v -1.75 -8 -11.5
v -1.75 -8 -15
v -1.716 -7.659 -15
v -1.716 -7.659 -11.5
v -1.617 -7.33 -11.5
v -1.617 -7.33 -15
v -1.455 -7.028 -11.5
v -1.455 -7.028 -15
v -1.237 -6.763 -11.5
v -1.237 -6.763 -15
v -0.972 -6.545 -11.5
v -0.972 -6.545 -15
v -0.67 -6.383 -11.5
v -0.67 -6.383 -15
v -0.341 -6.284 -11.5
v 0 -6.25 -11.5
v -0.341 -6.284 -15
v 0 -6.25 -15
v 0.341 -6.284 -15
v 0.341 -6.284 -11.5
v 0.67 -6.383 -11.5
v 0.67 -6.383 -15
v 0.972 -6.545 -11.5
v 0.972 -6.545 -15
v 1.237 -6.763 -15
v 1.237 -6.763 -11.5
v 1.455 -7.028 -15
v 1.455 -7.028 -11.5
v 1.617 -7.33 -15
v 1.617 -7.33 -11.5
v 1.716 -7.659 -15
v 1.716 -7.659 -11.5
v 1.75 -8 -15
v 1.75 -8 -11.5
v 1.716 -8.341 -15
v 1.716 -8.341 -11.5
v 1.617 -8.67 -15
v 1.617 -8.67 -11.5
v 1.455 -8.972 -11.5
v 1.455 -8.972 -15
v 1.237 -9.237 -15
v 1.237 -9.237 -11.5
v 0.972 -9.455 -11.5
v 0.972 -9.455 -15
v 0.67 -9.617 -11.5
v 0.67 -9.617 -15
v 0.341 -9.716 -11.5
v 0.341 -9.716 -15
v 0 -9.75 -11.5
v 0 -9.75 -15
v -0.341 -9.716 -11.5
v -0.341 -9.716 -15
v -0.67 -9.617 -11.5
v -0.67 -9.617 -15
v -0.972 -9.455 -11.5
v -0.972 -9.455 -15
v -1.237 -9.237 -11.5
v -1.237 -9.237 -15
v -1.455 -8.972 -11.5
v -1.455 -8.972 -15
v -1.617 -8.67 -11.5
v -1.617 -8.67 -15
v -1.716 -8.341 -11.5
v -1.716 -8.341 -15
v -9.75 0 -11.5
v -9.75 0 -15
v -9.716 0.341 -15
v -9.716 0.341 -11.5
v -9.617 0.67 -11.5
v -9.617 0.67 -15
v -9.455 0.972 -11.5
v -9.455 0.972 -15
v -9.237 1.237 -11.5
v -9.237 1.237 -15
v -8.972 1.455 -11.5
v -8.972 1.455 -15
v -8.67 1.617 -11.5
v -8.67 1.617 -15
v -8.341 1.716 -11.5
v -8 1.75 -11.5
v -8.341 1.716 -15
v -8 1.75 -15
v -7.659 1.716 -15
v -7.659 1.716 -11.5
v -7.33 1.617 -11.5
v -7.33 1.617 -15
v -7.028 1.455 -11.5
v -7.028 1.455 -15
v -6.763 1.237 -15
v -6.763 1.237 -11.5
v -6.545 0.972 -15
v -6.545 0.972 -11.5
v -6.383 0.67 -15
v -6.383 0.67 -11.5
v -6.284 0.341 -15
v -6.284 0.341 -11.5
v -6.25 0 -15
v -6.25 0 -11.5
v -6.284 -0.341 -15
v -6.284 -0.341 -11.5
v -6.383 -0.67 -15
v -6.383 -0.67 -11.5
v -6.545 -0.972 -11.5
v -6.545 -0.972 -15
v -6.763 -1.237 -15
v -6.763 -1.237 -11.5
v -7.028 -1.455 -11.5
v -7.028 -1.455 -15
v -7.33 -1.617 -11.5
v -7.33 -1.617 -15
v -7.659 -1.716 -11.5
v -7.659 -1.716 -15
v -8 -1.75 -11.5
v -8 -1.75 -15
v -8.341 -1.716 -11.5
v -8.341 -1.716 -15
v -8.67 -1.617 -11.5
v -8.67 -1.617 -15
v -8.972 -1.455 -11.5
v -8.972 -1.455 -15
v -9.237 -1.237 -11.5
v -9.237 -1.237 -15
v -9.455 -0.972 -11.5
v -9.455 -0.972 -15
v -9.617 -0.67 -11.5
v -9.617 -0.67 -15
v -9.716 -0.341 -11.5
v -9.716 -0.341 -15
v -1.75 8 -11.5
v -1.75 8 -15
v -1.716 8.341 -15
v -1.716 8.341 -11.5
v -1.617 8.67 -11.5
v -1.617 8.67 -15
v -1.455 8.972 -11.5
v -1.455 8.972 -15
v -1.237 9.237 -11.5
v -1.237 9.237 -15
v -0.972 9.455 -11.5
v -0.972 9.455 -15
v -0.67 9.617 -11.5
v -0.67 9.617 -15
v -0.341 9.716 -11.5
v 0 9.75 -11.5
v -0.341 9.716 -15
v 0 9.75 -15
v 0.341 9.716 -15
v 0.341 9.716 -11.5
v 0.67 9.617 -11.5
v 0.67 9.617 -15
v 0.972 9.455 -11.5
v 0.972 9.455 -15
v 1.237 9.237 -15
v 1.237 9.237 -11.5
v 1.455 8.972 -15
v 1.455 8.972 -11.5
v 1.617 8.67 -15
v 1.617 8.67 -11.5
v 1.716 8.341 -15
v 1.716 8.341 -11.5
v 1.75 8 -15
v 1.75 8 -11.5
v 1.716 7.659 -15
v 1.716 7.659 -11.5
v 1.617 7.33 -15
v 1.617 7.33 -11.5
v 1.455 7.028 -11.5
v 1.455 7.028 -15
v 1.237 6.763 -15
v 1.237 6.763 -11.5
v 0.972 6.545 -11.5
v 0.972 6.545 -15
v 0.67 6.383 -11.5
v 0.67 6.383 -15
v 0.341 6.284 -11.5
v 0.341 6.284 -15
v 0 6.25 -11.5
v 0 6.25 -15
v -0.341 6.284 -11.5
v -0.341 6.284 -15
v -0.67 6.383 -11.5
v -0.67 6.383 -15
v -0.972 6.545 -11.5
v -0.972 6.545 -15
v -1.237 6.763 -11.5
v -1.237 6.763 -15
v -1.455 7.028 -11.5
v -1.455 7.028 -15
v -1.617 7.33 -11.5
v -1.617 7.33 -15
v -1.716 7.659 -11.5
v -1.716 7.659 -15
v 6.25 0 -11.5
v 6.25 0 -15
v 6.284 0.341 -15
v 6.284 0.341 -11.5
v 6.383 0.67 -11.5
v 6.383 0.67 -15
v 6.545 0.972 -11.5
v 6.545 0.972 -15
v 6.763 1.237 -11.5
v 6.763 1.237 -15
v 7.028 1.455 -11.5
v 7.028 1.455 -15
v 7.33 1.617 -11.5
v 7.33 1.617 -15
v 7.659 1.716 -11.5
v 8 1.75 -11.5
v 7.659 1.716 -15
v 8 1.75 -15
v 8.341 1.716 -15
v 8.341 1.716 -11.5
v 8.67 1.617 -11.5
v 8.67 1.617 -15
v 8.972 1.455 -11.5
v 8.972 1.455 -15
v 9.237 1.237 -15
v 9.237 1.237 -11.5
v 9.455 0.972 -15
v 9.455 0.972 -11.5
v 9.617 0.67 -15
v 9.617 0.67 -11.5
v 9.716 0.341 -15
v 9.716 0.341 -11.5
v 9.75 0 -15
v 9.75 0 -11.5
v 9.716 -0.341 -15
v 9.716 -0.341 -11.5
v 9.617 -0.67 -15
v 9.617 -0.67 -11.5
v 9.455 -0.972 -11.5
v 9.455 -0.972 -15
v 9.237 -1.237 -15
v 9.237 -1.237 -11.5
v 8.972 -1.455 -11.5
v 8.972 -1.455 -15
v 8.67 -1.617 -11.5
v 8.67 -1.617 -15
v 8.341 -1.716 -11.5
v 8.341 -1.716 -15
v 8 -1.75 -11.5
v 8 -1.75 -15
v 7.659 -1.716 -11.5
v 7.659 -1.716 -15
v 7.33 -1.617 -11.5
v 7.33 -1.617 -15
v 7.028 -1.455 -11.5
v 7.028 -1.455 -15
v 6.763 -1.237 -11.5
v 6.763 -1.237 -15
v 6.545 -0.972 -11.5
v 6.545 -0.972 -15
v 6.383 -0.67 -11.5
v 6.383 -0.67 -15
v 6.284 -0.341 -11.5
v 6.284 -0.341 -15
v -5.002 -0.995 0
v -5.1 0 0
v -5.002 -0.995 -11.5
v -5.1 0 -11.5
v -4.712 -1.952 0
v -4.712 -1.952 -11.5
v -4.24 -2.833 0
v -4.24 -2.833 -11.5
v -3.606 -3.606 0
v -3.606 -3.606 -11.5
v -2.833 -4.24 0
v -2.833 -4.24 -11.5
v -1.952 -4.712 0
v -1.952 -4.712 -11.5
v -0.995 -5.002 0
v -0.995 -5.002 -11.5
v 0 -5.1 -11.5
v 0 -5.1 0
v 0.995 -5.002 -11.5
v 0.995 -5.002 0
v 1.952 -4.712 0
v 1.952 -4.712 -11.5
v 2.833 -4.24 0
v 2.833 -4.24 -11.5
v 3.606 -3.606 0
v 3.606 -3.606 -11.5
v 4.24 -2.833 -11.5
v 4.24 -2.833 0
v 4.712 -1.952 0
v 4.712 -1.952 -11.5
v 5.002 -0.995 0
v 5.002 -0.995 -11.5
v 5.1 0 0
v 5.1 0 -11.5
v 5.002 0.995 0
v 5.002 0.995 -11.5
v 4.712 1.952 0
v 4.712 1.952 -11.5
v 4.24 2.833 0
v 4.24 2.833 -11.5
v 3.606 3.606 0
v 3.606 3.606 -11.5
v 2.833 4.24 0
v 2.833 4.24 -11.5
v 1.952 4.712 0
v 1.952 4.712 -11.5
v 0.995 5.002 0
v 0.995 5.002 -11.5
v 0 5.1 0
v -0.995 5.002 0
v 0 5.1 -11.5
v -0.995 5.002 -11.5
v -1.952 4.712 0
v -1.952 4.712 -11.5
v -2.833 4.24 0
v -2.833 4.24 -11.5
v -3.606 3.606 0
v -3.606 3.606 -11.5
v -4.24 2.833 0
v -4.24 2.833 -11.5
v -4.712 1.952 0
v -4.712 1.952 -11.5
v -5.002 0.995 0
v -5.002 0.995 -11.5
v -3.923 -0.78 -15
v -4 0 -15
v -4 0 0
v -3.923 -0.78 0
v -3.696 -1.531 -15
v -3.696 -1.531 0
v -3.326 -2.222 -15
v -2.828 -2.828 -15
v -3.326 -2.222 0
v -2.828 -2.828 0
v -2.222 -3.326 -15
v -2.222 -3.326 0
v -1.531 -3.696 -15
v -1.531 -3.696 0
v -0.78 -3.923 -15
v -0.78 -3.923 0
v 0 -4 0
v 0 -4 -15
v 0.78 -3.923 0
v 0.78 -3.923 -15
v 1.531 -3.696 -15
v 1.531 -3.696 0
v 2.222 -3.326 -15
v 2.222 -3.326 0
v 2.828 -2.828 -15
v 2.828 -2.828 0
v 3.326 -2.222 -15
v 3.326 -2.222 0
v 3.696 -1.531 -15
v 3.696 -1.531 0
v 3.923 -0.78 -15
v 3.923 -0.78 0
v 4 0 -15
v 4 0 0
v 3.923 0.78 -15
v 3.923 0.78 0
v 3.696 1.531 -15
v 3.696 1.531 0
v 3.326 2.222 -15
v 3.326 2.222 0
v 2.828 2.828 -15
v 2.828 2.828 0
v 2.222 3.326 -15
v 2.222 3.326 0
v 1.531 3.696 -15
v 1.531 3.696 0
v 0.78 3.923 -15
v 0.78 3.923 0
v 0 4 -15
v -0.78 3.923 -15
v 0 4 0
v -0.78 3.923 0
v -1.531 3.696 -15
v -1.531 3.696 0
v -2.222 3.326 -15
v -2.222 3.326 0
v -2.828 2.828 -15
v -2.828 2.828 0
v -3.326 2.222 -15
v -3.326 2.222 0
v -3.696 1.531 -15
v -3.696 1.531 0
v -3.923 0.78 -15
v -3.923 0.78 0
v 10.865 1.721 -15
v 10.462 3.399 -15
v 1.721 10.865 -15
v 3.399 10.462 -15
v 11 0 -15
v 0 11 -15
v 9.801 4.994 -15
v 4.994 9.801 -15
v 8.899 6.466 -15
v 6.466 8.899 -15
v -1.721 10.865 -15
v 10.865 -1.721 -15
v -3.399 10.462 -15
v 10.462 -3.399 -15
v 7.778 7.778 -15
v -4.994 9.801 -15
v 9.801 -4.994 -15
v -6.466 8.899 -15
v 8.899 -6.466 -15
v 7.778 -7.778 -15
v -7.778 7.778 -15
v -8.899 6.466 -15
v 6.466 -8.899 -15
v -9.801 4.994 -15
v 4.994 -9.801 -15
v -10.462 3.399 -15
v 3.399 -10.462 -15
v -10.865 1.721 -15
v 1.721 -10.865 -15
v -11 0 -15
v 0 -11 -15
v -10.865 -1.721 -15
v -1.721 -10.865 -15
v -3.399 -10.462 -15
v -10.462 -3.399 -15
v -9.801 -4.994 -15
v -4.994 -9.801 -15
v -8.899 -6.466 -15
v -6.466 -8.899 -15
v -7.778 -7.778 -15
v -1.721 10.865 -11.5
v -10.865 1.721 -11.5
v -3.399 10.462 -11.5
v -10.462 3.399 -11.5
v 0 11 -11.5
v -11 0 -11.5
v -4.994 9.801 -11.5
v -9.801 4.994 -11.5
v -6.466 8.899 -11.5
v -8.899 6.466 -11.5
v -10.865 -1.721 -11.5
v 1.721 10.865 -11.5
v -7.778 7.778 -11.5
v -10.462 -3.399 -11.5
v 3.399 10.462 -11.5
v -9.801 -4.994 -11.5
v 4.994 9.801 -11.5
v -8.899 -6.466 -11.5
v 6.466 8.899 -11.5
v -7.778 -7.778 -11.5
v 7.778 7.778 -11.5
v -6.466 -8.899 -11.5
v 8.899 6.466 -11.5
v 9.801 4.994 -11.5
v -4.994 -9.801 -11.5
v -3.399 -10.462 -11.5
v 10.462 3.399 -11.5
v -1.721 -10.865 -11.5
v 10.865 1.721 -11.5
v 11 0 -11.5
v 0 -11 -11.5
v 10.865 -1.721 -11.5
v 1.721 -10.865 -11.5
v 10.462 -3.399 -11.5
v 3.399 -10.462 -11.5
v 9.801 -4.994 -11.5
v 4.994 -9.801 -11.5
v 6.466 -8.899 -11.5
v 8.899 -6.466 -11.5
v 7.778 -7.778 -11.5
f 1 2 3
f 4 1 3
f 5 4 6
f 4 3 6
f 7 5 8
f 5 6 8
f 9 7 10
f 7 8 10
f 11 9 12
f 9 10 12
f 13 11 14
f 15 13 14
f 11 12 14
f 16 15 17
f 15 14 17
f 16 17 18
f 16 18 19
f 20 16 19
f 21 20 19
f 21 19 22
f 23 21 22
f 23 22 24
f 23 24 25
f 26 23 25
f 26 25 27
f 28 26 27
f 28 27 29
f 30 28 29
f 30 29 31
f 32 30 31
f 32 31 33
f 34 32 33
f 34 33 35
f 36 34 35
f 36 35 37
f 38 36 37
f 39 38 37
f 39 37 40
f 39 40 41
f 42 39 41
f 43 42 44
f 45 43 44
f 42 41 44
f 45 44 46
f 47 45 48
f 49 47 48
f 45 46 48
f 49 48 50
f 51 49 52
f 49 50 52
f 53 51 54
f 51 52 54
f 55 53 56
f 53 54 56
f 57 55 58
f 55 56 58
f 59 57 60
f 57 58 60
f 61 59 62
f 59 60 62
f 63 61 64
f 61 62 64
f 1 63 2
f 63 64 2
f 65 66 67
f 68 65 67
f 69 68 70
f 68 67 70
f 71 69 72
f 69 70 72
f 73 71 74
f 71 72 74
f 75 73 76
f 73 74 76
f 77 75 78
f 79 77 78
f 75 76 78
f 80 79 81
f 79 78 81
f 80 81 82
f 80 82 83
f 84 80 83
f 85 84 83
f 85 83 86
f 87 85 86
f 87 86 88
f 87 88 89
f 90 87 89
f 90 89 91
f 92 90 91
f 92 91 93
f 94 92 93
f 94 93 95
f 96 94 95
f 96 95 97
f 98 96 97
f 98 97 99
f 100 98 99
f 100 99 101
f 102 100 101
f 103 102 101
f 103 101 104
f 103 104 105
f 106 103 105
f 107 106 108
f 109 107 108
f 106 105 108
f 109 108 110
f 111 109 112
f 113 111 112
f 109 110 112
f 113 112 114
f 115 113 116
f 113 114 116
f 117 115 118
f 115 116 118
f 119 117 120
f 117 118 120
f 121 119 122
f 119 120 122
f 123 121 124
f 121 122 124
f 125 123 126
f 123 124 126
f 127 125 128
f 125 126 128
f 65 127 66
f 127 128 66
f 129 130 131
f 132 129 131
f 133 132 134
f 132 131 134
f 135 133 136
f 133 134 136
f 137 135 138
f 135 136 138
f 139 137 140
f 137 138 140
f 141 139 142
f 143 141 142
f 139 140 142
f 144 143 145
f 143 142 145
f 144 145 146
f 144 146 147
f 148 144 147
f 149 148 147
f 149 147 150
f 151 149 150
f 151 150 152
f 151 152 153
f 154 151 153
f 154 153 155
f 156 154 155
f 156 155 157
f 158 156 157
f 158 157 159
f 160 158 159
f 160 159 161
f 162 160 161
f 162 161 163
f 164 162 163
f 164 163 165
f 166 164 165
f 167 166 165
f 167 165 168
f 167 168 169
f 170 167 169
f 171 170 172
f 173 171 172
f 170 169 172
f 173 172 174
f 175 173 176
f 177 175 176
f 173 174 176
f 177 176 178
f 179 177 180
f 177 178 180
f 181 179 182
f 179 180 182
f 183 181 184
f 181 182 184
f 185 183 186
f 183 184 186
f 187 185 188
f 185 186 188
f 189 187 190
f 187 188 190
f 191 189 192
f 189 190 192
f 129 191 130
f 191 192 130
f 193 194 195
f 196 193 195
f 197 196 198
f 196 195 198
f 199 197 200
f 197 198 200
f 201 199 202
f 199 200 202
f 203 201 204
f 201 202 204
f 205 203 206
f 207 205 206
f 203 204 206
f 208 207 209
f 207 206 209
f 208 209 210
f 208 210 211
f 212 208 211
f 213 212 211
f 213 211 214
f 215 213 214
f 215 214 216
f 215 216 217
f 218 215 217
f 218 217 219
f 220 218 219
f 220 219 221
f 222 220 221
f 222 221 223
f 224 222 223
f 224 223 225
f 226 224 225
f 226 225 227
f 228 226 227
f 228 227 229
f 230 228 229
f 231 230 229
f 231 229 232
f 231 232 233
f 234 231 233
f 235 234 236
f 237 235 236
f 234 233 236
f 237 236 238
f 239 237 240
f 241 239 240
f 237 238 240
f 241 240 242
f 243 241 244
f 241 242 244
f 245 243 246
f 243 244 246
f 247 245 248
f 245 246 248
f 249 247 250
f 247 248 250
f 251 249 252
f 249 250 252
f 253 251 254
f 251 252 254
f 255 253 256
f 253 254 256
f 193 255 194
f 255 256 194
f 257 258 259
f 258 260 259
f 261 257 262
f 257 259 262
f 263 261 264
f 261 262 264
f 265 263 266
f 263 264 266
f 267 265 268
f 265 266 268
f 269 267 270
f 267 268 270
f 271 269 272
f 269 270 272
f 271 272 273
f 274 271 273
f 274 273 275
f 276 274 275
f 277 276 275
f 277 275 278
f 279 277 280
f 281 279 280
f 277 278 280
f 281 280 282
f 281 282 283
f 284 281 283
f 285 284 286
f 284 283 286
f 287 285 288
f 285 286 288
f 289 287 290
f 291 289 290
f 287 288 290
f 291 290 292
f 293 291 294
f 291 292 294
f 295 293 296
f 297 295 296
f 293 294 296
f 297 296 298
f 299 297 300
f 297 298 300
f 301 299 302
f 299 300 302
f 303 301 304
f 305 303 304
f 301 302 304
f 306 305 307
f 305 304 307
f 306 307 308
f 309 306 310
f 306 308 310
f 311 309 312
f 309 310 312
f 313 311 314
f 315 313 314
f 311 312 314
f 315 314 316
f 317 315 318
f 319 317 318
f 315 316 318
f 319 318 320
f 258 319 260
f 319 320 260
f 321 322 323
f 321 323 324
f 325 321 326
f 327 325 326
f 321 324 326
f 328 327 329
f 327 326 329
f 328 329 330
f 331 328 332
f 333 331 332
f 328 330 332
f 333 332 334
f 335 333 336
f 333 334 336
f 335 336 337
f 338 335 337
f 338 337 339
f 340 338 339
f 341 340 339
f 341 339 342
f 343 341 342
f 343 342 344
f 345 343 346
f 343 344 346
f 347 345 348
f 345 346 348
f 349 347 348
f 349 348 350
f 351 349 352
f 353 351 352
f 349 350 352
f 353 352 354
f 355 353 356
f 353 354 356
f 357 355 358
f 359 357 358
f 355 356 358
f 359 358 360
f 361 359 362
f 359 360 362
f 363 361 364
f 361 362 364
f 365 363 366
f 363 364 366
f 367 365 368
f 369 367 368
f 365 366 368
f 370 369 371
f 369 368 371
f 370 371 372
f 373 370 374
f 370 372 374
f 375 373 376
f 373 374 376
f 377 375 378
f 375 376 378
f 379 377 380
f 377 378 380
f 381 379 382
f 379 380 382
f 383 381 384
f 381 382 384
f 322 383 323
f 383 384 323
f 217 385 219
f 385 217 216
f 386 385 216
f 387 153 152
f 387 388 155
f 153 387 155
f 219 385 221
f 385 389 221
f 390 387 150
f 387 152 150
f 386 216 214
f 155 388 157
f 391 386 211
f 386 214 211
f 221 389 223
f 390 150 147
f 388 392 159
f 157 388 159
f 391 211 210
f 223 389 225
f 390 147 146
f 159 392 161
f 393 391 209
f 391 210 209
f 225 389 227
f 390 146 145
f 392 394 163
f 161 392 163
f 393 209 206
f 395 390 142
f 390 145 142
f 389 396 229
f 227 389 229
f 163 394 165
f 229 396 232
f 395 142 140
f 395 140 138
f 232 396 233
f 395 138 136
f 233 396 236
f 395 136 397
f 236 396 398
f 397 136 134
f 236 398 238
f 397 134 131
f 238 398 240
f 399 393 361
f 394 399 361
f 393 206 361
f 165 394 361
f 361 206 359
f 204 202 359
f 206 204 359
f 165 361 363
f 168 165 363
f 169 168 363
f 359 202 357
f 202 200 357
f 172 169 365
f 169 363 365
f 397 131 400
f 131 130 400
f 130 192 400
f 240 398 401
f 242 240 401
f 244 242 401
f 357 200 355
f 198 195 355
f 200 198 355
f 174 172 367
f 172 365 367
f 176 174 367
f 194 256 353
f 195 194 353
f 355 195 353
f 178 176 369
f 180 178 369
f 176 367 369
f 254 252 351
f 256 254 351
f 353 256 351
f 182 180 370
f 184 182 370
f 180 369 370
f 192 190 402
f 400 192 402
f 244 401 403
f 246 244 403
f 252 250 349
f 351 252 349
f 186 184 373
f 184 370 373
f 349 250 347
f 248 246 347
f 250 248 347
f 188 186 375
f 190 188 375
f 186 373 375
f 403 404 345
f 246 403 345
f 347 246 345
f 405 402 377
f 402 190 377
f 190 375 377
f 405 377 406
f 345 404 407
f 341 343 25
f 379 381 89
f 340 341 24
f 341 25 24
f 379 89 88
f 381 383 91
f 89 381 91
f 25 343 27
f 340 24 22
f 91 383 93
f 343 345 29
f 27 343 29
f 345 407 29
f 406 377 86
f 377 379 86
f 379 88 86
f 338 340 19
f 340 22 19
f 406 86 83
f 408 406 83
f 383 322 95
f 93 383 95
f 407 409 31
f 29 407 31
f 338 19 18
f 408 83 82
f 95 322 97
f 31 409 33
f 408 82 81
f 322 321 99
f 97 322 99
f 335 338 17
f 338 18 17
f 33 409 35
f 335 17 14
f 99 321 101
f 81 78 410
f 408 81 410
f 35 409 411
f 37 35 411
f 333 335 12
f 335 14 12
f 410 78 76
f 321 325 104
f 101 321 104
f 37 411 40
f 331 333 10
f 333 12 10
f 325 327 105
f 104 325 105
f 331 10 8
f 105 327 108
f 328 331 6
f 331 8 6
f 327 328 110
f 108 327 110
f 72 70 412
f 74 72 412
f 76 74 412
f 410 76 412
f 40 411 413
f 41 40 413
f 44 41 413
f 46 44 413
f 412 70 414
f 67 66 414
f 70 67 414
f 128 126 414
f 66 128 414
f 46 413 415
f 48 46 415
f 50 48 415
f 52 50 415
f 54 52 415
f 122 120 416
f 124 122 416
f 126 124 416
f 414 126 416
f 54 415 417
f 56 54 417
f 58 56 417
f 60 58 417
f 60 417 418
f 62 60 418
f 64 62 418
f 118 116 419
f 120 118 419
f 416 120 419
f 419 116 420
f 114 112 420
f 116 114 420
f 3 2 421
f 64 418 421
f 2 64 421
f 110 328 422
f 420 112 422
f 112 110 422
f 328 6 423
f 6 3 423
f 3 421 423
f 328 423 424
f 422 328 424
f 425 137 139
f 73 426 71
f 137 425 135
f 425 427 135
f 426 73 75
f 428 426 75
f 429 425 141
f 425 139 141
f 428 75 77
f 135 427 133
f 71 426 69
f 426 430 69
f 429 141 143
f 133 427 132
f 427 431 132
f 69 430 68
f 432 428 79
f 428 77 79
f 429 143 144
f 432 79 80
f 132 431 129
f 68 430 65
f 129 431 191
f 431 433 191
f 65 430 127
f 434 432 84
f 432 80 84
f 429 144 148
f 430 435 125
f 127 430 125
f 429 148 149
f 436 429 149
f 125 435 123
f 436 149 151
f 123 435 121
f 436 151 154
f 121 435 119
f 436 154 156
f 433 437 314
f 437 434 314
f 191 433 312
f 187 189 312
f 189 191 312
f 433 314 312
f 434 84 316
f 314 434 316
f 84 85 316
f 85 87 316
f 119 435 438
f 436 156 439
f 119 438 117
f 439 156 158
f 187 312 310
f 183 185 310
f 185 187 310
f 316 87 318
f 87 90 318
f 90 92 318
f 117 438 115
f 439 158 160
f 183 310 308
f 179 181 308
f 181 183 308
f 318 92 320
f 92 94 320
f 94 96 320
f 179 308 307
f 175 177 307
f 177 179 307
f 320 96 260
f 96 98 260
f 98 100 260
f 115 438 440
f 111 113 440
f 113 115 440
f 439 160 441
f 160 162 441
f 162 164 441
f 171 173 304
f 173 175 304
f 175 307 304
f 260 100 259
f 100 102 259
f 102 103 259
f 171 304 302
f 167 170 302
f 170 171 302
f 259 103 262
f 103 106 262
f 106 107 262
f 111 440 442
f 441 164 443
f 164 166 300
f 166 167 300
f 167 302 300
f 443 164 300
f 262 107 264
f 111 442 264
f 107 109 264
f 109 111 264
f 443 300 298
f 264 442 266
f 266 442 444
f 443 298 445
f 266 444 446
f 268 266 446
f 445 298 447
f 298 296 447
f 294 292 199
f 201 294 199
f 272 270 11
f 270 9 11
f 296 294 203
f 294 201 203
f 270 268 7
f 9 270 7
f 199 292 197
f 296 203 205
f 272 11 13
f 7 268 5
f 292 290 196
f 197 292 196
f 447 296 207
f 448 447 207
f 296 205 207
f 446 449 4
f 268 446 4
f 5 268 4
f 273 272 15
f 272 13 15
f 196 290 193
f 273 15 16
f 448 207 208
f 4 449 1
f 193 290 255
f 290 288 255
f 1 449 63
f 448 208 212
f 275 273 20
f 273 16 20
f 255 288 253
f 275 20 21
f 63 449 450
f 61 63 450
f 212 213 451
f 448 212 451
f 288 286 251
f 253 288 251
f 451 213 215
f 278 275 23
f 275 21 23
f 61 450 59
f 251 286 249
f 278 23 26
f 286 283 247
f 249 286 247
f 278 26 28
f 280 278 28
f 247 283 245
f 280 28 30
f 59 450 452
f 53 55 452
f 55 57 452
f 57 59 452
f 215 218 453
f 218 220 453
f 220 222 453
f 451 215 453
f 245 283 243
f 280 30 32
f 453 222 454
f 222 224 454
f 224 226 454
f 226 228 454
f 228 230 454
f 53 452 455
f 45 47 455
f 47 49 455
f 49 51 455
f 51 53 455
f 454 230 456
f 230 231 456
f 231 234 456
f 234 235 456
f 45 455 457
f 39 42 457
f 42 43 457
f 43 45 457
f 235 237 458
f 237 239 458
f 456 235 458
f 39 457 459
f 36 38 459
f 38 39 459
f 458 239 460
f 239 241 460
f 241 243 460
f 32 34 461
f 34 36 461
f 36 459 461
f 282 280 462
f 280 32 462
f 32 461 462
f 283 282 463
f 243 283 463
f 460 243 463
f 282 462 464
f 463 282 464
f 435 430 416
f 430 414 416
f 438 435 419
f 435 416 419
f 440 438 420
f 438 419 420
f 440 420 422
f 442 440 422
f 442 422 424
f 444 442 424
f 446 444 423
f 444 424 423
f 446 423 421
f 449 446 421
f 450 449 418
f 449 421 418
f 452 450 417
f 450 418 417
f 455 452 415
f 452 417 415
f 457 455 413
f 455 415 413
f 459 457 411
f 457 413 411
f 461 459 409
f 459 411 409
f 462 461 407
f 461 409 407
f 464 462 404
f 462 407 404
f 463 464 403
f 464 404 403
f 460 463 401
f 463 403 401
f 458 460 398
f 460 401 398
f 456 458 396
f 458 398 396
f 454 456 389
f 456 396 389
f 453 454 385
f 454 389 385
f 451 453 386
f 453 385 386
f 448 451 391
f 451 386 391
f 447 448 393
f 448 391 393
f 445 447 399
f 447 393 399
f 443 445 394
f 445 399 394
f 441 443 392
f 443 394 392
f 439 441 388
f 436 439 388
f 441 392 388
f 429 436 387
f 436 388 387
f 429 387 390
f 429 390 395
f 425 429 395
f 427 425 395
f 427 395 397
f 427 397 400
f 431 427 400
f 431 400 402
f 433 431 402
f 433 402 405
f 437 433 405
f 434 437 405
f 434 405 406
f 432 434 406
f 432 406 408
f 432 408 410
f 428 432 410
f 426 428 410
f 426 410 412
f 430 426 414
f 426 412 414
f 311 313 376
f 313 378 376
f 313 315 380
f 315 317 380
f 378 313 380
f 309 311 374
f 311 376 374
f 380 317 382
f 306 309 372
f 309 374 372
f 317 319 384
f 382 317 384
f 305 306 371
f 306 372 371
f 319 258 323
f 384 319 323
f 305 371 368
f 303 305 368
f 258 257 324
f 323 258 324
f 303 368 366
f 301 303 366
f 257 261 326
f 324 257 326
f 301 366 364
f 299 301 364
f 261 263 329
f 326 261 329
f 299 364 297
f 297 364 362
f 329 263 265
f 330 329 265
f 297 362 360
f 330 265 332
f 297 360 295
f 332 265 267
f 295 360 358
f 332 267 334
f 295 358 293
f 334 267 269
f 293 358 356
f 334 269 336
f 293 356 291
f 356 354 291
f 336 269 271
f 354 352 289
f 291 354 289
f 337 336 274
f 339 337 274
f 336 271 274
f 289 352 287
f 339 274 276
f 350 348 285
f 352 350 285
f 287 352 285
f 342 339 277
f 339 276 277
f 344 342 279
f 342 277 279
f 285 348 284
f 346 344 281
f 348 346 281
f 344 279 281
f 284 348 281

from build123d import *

# Parameters (mm, degrees)
SKETCH_2_R          = 1.75
CUT_EXTRUDE_1_DEPTH = 22.610182785


with BuildPart() as part:
    # 草图1 → 旋转1 (revolve)
    with BuildSketch(Plane(origin=(0, 0, 0), x_dir=(1, 0, 0), z_dir=(0, 1, 0)), mode=Mode.PRIVATE) as revolve_1_sk:
        Polygon((4, 15), (4, 0), (5.1, 0), (5.1, 11.5), (11, 11.5), (11, 15), align=None)
    revolve(revolve_1_sk.sketch.rotate(Axis((0, 0, -35.917436649), (0, 0, 1)), 180), axis=Axis((0, 0, -35.917436649), (0, 0, 1)))

    # 草图2 → 切除-拉伸1 (cut, through all)
    with BuildSketch(Plane(origin=(0, 0, -15), x_dir=(-1, 0, 0), z_dir=(0, 0, -1))):
        with Locations((0, 8)):
            Circle(SKETCH_2_R)
        with Locations((8, 0)):
            Circle(SKETCH_2_R)
        with Locations((0, -8)):
            Circle(SKETCH_2_R)
        with Locations((-8, 0)):
            Circle(SKETCH_2_R)
    extrude(amount=-CUT_EXTRUDE_1_DEPTH, mode=Mode.SUBTRACT)


solid = part.part
